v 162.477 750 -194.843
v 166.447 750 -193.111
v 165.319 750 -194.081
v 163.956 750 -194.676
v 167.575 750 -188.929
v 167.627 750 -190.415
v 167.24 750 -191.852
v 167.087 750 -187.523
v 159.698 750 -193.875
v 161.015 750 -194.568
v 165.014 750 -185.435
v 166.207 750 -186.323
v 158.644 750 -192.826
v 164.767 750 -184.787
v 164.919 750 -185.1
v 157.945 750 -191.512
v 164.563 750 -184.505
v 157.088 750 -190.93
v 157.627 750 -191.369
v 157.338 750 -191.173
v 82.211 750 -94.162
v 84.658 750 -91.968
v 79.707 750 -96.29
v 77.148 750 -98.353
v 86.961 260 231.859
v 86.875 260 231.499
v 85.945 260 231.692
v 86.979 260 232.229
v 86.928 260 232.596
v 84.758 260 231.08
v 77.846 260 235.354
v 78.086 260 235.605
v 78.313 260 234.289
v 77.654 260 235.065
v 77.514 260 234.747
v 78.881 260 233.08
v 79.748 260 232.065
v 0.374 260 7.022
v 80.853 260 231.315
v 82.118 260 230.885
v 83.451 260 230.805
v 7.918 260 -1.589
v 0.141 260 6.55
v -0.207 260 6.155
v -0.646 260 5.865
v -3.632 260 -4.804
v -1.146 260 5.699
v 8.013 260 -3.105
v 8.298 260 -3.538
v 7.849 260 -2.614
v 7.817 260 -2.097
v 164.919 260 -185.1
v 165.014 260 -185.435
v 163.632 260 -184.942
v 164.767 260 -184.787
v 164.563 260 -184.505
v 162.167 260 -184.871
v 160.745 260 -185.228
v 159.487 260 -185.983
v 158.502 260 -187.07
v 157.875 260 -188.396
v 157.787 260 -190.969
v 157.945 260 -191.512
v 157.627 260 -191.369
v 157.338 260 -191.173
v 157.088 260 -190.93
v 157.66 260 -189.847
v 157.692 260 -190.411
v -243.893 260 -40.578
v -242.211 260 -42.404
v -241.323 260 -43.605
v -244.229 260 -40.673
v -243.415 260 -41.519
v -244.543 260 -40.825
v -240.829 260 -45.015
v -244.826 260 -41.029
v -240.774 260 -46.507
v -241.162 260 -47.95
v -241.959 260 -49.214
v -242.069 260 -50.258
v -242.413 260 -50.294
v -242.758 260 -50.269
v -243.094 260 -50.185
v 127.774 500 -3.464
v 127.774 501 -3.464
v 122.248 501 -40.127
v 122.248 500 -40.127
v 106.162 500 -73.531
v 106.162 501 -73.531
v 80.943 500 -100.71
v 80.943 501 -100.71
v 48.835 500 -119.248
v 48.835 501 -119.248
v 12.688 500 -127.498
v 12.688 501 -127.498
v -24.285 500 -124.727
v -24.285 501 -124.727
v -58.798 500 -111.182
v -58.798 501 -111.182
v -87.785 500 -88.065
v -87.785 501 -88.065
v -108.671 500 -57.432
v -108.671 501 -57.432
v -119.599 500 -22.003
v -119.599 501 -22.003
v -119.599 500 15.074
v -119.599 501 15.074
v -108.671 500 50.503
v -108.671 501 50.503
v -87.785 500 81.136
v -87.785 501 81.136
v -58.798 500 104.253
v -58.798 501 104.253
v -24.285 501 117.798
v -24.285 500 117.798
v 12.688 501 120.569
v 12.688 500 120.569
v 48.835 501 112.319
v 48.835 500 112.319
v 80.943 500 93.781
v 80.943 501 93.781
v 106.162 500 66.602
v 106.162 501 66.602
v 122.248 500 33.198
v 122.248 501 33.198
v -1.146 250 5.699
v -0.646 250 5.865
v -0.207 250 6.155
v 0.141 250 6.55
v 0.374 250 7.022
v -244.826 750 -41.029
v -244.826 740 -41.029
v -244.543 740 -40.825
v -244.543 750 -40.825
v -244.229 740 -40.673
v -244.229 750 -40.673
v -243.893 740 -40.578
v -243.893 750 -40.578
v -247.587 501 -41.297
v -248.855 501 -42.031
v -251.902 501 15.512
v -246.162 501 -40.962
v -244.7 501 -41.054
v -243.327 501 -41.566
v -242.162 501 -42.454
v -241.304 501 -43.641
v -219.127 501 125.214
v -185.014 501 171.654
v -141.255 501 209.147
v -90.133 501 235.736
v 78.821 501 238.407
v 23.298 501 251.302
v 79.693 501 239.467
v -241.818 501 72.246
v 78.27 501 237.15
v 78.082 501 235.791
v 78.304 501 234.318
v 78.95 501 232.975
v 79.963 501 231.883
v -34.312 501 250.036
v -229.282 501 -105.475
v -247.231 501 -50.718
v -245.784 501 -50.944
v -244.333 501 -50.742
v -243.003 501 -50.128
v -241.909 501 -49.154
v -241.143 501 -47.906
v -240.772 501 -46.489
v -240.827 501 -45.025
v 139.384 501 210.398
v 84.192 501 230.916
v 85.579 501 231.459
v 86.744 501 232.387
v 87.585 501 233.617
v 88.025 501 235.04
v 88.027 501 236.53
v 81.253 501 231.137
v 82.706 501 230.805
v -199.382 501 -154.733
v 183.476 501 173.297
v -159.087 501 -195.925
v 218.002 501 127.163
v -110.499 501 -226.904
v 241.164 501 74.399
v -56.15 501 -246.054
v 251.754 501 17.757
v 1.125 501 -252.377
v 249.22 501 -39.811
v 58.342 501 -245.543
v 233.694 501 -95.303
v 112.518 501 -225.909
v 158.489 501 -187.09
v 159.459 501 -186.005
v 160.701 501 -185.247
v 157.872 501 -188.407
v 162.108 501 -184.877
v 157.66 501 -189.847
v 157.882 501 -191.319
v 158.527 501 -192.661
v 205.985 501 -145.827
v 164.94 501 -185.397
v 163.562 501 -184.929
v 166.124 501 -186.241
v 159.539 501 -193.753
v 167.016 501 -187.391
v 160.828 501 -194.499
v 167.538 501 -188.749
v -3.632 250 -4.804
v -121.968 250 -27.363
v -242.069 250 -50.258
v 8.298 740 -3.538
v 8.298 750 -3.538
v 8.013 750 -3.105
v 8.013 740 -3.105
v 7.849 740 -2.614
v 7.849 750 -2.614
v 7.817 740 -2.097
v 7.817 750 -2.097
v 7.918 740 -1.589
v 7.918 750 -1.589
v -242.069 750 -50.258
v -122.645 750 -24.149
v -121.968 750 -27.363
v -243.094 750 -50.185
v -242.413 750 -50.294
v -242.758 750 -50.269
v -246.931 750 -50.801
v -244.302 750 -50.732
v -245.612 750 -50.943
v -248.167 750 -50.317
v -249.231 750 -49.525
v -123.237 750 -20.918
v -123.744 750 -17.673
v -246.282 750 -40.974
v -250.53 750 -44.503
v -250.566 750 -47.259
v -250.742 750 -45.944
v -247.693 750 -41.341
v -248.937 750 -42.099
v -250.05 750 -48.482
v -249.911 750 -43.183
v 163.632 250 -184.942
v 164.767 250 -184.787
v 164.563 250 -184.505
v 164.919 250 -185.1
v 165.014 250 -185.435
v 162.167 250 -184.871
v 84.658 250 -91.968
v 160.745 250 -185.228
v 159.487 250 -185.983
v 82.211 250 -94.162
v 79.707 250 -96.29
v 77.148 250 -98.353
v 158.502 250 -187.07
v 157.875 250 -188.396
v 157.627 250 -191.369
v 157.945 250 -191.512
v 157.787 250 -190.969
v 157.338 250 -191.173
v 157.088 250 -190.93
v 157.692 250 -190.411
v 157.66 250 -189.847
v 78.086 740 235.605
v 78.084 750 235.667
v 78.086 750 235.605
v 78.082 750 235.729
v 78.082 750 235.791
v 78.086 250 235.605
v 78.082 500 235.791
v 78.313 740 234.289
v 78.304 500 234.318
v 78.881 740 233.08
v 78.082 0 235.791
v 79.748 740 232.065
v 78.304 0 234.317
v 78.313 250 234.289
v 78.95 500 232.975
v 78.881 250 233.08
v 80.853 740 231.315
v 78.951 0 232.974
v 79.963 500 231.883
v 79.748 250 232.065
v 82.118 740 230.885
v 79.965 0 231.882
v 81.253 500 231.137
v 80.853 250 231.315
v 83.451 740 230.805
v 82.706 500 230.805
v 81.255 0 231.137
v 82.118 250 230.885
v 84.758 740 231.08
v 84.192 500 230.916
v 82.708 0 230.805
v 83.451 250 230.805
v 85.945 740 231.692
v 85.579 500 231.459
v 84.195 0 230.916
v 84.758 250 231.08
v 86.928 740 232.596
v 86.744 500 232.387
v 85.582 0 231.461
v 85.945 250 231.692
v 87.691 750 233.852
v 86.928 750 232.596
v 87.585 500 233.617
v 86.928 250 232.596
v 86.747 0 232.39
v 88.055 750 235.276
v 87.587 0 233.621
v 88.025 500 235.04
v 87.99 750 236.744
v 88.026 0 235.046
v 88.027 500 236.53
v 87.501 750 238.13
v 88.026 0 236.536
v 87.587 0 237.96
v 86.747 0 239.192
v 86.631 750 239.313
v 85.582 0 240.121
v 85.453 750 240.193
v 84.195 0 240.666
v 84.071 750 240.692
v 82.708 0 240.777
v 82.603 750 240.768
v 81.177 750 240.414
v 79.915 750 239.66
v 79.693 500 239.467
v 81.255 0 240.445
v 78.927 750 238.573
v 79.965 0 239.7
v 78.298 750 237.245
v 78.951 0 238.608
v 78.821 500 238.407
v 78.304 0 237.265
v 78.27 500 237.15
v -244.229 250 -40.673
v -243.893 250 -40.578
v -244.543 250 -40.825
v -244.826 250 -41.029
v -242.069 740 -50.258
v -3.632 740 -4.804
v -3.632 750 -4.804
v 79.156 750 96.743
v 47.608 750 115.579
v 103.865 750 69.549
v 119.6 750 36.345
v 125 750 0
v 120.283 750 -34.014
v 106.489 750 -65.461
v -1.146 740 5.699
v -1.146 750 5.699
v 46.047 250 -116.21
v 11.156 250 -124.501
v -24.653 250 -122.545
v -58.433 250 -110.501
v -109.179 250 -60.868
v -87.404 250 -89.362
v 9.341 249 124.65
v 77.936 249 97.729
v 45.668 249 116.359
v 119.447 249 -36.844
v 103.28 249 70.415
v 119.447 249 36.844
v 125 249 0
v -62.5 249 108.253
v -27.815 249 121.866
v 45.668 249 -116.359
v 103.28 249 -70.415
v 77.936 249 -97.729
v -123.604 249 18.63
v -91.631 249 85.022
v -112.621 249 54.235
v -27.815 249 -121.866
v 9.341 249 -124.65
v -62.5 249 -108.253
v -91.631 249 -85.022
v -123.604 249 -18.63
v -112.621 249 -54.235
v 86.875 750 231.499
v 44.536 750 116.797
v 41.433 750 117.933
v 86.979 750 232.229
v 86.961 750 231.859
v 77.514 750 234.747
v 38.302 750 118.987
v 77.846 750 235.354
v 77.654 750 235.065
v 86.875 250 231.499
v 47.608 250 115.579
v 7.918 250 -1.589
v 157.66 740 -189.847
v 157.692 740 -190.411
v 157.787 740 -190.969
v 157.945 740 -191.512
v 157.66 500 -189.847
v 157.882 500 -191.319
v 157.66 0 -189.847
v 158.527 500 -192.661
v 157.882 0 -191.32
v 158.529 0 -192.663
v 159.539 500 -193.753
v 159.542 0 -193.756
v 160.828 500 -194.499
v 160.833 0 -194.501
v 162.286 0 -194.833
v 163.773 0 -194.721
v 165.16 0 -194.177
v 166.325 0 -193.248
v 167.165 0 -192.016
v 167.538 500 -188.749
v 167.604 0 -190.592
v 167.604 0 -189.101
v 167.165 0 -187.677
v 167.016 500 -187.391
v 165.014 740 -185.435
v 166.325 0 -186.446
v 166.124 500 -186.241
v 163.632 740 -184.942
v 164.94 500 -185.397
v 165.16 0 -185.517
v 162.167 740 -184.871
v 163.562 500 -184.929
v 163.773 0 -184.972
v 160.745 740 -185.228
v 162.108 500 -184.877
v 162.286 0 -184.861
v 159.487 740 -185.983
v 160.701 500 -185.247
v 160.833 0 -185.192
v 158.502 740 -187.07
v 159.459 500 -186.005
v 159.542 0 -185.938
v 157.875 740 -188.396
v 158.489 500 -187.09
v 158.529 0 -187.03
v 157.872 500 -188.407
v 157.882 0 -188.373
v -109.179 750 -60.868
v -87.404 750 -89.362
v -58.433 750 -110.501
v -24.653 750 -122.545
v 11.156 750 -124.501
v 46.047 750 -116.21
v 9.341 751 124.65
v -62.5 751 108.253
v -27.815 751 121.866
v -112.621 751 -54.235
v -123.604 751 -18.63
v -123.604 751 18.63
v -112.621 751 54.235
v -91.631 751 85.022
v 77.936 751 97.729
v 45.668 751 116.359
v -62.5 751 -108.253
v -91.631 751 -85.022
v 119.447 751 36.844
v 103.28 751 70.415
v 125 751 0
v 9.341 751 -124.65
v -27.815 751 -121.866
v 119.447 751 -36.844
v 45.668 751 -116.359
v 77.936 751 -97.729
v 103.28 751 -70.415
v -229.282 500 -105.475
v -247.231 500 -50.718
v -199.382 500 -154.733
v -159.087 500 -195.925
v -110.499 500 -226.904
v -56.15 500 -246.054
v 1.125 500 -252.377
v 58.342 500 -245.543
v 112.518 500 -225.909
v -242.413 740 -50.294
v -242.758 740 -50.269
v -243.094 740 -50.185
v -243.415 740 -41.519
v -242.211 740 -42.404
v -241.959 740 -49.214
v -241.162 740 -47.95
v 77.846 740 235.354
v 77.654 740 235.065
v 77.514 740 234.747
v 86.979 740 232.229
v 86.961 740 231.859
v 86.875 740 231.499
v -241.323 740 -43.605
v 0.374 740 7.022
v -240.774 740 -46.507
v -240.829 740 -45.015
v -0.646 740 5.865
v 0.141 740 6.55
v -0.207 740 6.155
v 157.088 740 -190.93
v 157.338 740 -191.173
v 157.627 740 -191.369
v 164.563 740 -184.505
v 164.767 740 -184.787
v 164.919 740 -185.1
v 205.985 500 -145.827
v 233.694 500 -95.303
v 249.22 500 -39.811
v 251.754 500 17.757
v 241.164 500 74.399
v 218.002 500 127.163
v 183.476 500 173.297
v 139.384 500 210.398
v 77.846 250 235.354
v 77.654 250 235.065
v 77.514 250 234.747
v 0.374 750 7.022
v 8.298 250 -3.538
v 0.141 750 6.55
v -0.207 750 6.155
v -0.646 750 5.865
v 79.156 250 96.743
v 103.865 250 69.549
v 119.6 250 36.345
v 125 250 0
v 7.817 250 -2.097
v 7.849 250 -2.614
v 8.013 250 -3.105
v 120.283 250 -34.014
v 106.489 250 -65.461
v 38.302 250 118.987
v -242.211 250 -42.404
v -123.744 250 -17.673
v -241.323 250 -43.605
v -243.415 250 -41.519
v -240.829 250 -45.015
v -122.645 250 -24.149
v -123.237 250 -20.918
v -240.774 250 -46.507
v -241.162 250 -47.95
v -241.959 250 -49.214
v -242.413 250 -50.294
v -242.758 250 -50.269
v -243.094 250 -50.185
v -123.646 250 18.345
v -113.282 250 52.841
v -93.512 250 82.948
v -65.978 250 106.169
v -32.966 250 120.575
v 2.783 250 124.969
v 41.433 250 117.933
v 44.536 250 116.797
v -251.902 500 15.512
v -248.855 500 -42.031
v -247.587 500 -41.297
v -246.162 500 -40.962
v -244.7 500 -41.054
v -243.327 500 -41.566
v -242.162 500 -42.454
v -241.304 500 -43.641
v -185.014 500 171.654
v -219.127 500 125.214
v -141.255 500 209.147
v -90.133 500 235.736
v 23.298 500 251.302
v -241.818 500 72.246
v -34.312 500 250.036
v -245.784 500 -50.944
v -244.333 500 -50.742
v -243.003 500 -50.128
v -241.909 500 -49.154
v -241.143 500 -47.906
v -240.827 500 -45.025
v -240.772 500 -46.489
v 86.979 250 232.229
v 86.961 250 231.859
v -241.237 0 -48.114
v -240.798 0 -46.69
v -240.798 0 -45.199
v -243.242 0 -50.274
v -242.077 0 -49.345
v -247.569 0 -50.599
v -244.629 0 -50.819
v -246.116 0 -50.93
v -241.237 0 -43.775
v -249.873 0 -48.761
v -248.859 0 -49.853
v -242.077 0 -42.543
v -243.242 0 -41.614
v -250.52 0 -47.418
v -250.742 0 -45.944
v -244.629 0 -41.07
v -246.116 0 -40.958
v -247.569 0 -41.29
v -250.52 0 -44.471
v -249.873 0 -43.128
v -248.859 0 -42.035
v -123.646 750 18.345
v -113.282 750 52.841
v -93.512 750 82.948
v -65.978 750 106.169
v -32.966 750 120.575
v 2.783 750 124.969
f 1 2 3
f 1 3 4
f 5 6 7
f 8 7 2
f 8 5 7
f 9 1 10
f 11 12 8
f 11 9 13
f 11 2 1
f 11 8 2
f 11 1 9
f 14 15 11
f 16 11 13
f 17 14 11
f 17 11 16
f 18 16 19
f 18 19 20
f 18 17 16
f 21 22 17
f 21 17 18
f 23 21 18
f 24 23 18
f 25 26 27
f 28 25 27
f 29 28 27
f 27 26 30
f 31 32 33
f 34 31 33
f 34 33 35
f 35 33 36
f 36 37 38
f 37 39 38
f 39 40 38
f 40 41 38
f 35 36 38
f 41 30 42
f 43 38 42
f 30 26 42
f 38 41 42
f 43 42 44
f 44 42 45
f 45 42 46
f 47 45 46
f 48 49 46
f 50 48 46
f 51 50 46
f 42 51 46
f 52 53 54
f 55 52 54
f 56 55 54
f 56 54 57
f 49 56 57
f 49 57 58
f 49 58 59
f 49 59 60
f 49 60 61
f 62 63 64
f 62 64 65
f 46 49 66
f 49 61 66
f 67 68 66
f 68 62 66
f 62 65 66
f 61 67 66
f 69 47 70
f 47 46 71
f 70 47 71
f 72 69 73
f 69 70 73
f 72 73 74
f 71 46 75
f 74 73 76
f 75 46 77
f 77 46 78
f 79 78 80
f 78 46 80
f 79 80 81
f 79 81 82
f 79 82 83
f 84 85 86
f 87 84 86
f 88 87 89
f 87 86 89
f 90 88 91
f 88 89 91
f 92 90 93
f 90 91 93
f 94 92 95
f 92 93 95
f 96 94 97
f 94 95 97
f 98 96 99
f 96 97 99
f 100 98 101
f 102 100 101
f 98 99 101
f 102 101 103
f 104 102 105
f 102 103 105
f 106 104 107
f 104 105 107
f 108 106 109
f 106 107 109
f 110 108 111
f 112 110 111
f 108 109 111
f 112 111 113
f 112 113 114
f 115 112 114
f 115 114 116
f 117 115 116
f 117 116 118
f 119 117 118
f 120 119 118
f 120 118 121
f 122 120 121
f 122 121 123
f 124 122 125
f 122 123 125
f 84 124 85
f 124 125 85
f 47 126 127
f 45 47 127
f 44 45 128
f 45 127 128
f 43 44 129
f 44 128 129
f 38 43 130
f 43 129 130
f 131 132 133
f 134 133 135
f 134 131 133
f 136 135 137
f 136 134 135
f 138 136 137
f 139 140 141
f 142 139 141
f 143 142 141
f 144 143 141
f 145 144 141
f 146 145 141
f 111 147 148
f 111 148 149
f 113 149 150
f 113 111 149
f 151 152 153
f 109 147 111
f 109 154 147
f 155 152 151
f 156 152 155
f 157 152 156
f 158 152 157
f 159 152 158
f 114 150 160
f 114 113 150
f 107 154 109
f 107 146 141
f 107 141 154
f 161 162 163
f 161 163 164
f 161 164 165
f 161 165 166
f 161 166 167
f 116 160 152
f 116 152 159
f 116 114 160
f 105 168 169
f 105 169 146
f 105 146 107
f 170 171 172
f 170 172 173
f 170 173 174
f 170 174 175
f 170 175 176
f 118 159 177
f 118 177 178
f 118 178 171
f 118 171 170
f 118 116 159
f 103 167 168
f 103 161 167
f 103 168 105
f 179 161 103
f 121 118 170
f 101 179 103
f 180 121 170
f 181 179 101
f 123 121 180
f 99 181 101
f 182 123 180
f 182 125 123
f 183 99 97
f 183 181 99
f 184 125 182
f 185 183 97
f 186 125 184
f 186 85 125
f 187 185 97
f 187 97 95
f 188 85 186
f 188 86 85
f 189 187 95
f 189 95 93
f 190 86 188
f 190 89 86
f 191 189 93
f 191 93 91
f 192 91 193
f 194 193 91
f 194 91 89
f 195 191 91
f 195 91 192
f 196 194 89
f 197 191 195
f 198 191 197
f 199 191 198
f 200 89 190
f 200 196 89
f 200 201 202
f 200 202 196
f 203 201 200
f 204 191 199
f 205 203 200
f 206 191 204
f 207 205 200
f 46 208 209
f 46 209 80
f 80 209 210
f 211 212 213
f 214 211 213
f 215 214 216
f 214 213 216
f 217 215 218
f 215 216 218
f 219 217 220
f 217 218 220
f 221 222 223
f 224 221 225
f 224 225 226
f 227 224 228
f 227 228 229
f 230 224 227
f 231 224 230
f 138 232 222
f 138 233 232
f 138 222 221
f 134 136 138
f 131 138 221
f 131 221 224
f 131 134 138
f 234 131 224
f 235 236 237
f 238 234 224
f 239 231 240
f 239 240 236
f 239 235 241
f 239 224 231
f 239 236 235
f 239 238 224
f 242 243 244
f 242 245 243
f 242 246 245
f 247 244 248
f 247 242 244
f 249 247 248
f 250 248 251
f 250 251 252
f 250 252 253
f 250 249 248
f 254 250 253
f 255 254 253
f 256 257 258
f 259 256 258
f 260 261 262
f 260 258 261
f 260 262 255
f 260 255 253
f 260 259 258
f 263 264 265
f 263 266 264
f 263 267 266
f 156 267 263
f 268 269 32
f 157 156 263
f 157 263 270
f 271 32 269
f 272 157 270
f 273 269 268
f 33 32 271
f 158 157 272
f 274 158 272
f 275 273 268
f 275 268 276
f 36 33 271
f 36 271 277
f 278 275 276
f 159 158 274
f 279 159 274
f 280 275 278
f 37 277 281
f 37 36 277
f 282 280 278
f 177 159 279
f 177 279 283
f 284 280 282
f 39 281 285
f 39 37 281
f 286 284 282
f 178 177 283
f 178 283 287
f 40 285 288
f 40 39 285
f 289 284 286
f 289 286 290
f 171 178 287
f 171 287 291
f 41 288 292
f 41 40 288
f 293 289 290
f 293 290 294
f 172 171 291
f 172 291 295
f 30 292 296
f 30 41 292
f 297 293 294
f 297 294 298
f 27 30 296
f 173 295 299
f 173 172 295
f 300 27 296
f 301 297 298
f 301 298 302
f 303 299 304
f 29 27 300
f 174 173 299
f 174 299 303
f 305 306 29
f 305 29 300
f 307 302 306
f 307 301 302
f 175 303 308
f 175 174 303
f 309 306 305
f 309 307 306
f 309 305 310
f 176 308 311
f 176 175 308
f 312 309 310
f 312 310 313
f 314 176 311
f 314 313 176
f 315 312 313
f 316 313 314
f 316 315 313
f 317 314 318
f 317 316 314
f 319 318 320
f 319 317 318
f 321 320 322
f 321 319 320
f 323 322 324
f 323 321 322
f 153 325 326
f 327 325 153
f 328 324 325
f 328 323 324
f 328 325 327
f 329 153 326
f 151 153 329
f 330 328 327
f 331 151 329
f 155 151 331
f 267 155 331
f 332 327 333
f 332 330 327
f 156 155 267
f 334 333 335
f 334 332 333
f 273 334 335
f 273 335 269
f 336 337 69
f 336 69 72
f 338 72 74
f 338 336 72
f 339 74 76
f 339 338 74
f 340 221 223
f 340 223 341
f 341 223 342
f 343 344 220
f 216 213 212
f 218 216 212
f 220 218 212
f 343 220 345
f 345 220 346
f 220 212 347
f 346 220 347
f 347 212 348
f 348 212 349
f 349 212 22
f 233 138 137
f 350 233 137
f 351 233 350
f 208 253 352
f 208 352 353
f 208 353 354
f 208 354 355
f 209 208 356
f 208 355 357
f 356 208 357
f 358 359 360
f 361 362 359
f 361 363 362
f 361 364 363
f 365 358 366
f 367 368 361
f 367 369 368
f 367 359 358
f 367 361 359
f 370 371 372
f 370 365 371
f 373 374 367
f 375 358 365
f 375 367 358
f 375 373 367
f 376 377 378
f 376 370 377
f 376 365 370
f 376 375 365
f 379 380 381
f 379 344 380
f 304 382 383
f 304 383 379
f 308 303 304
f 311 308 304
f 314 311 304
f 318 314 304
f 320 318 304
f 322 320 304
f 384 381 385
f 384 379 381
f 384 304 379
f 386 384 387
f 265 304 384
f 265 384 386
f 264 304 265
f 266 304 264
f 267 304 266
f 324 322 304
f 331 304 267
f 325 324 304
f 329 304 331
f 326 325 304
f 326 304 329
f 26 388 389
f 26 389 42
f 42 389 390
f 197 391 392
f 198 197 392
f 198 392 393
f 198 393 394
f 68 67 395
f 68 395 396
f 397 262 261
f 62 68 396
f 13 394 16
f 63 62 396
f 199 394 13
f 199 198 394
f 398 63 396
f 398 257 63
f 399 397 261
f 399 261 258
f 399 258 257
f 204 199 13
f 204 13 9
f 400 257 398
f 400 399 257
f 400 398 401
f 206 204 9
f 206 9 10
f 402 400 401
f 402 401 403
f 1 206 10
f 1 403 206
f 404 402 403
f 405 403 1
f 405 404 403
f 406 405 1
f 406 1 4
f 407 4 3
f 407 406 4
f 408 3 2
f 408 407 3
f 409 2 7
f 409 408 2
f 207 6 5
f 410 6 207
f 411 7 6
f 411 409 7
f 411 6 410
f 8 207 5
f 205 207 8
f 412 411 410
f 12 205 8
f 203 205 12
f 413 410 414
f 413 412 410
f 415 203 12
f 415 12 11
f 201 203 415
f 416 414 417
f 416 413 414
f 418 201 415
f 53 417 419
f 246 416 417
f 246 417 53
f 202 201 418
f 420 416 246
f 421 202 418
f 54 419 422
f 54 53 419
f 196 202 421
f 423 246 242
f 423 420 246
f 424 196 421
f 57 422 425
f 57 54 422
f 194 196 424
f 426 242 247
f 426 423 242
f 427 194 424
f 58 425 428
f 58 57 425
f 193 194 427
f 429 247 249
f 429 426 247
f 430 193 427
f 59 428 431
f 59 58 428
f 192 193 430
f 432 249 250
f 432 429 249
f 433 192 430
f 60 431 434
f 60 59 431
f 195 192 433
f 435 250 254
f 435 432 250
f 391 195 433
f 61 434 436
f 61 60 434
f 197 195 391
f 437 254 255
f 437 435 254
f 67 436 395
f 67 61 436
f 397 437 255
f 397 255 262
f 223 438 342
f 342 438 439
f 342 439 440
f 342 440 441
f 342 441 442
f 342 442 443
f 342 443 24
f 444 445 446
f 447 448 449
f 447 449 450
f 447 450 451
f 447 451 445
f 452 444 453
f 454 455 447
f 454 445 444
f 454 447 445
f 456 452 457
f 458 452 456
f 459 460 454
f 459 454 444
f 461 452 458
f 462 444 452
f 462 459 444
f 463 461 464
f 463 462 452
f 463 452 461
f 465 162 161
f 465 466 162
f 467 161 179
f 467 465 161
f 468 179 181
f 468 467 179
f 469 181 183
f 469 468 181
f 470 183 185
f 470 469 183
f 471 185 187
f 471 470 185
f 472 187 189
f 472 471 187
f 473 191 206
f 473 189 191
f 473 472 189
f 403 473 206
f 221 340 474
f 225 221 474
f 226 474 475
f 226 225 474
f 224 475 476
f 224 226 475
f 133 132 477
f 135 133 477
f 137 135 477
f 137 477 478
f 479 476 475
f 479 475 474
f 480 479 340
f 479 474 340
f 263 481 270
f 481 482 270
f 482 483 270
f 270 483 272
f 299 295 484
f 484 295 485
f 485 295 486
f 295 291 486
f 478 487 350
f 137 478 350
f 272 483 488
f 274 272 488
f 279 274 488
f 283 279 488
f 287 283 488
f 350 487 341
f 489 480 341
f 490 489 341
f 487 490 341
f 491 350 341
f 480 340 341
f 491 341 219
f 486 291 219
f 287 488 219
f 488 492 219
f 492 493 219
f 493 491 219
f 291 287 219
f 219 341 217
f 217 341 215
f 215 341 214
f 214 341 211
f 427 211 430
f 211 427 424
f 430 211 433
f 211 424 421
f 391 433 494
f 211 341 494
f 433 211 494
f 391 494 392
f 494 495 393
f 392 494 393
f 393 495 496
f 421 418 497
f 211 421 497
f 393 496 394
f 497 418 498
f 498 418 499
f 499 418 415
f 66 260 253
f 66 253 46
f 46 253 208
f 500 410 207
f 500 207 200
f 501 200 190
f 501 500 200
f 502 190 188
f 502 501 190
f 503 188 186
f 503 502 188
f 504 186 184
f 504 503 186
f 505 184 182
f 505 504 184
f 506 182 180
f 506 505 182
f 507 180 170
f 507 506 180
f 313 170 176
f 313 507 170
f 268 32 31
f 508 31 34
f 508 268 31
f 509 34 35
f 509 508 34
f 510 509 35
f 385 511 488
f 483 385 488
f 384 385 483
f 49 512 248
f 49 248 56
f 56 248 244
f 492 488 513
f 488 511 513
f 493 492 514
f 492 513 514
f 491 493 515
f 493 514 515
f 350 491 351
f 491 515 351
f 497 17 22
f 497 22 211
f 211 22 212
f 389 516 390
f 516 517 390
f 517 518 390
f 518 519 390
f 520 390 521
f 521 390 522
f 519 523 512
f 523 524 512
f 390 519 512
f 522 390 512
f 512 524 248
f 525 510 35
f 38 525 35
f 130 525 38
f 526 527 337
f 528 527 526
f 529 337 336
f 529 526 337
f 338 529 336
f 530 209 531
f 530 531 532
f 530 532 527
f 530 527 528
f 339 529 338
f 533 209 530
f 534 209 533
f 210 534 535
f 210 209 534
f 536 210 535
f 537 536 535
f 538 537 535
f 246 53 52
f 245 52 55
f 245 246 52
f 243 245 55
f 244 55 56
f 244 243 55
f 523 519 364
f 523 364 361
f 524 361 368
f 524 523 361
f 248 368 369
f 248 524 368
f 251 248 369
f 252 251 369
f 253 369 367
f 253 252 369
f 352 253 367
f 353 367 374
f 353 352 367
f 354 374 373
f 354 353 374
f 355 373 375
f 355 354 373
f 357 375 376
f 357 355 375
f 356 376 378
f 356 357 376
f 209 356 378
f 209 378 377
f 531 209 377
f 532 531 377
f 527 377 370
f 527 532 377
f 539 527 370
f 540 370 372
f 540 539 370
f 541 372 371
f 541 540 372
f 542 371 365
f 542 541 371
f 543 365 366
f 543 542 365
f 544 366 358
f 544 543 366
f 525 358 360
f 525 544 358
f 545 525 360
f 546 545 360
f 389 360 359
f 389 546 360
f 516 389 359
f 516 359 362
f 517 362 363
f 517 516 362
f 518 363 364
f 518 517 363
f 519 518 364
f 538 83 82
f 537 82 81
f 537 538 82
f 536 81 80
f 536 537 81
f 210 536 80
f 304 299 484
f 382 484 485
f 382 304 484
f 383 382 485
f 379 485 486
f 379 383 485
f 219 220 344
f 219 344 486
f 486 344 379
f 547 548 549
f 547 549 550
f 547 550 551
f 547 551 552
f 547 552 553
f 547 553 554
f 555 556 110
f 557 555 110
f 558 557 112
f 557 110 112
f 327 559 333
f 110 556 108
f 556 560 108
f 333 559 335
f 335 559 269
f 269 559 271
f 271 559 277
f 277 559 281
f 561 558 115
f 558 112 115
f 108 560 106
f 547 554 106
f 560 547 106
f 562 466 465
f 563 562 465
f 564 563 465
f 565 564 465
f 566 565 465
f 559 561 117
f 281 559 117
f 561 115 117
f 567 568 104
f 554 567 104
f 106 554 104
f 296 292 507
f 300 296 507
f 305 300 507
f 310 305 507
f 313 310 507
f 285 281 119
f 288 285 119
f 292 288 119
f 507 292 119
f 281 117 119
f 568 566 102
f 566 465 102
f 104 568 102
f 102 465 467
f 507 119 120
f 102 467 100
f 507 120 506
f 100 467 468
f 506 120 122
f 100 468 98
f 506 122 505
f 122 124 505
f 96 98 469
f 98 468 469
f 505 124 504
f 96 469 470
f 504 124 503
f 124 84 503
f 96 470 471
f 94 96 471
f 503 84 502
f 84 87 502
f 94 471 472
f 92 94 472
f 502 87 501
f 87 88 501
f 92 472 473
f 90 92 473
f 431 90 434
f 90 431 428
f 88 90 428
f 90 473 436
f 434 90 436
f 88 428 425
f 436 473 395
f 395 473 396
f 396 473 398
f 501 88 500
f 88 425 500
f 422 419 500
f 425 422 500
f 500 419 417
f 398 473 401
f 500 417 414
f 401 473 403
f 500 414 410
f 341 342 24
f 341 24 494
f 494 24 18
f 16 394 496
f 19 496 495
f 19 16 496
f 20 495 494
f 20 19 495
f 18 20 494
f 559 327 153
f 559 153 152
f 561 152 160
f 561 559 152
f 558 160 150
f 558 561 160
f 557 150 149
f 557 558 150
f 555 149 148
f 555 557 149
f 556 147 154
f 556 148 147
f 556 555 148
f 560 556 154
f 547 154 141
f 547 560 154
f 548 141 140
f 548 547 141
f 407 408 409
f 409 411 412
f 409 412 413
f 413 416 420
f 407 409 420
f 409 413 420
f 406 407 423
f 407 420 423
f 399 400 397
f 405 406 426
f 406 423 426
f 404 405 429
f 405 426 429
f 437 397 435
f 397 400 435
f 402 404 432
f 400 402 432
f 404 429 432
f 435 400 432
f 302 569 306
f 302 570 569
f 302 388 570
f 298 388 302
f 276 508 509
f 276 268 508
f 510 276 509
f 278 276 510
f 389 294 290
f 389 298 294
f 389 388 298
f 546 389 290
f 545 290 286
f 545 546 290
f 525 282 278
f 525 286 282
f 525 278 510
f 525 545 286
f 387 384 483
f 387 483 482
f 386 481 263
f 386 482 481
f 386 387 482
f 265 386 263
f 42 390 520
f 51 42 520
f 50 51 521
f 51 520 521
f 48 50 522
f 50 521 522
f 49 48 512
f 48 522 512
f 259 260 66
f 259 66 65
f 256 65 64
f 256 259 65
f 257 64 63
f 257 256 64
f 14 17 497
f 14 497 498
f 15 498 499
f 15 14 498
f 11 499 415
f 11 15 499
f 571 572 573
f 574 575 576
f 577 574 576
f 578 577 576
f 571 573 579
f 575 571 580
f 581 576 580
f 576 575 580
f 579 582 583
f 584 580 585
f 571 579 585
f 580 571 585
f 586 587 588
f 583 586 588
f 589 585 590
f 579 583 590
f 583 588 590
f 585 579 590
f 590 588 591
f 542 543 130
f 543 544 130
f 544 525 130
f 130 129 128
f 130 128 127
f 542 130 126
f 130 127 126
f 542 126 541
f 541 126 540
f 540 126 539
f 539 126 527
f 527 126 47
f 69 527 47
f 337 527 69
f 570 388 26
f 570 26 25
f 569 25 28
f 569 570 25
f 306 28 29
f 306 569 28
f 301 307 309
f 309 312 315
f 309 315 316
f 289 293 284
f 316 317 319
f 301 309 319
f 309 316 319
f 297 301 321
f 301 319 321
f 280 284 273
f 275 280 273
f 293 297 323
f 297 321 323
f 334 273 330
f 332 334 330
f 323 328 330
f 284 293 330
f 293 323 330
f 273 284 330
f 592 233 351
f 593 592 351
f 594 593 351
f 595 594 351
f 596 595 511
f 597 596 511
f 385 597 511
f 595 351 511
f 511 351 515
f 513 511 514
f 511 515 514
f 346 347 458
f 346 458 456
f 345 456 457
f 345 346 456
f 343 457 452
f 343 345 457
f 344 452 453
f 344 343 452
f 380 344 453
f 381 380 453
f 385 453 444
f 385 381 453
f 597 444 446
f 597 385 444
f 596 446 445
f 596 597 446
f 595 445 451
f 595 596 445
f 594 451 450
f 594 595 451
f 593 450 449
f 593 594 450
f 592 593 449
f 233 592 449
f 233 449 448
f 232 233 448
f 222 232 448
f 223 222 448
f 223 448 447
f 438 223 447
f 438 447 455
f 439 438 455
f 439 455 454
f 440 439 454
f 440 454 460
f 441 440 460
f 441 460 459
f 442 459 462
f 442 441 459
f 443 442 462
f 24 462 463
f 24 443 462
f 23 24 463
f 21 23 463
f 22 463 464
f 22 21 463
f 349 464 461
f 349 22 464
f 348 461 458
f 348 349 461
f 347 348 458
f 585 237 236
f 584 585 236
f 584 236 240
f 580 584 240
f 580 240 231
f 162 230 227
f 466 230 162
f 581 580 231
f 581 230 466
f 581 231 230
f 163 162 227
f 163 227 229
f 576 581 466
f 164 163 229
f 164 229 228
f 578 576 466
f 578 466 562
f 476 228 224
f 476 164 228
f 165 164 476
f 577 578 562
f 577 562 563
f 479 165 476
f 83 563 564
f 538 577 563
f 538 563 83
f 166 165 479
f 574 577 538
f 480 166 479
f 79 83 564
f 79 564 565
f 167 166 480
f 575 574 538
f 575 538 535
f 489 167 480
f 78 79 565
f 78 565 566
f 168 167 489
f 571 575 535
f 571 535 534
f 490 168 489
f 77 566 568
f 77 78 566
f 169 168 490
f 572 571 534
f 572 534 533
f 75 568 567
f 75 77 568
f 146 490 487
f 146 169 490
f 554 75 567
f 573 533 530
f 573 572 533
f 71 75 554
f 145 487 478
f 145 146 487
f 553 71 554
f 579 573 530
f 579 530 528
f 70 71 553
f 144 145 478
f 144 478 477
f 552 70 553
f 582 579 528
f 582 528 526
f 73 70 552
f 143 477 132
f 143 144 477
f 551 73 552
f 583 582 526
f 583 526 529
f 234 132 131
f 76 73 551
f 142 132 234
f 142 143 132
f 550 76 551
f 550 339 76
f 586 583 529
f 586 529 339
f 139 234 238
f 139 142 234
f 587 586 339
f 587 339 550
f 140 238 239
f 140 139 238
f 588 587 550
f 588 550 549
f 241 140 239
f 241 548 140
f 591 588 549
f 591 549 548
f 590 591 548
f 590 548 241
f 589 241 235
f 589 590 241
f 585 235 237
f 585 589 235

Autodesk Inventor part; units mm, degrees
ref_plane "YZ Plane" through (0, 0, 0) normal (1, 0, 0) x (0, 1, 0)
ref_plane "XZ Plane" through (0, 0, 0) normal (0, 1, 0) x (-1, 0, 0)
sketch "Sketch1" plane through (0, 0, 0) normal (0, 1, 0) x (-1, 0, 0)
  circle A0 centre (-83.0821, 235.7909) radius 5
  circle A1 centre (-162.6599, -189.8467) radius 5
  circle A2 centre (245.742, -45.9443) radius 5
  point P0 (0, 0)
  dimension "d3" = 10
  dimension "d4" = 10
  dimension "d5" = 10
extrude "Extrusion1" add sketch "Sketch1" along normal blind 750
sketch "Sketch2" plane through (83.0821, 750, 235.7909) normal (0, 1, 0) x (1, 0, 0)
  circle A0 centre (-328.8241, 281.7352) radius 5 projected
  circle A1 centre (79.5778, 425.6376) radius 5 projected
  line L0 (-326.9753, 276.3685) -> (-84.2277, 230.0921)
  line L1 (-82.7079, 228.7691) -> (-5.5677, 1.0437)
  circle A2 centre (0, 0) radius 5 projected
  line L2 (-325.1511, 286.0493) -> (-86.7137, 240.5946)
  line L3 (-86.7137, 240.5946) -> (74.0056, 426.7207)
  line L4 (81.481, 420.2957) -> (-74.7837, 239.3284)
  line L5 (-75.1642, 237.3796) -> (3.7927, 4.2915)
  arc A3 (-327.4871, 284.4754) -> (-328.5709, 278.6773) centre (-83.0821, 235.7909) ccw
  arc A4 (-3.0309, -0.2086) -> (2.5859, 1.7717) centre (-83.0821, 235.7909) ccw
  arc A5 (81.2864, 423.1061) -> (76.8025, 426.9477) centre (-83.0821, 235.7909) ccw
  arc A6 (-82.7079, 228.7691) -> (-84.2277, 230.0921) centre (-84.6022, 228.1275) ccw
  arc A7 (76.8025, 426.9477) -> (74.0056, 426.7207) centre (75.5193, 425.4136) ccw
  arc A8 (81.481, 420.2957) -> (81.2864, 423.1061) centre (79.9673, 421.6028) ccw
  arc A9 (2.5859, 1.7717) -> (3.7927, 4.2915) centre (1.8984, 3.6499) ccw
  arc A10 (-5.5677, 1.0437) -> (-3.0309, -0.2086) centre (-3.6734, 1.6854) ccw
  arc A11 (-74.7837, 239.3284) -> (-75.1642, 237.3796) centre (-73.2699, 238.0212) ccw
  arc A12 (-328.5709, 278.6773) -> (-326.9753, 276.3685) centre (-326.6007, 278.3331) ccw
  arc A13 (-325.1511, 286.0493) -> (-327.4871, 284.4754) centre (-325.5257, 284.0846) ccw
  point P0 (-83.0821, 235.7909)
  point P1 (-328.9022, 276.7358)
  point P2 (-4.9283, -0.8437)
  point P3 (75.2872, 428.2049)
  point P4 (82.7726, 421.7915)
  point P5 (-75.5311, 238.4628)
  point P6 (4.4165, 2.45)
  dimension "d8" = 2
  dimension "d9" = 2
extrude "Extrusion2" add sketch "Sketch2" against normal blind 10 contours A0 A12 A3 A13 | A0 A13 L2 L3 A7 A1 A8 L4 A11 L5 A9 A2 A10 L1 A6 L0 A12 | A7 A5 A8 A1 | A2 A9 A4 A10 picked at (-326.6818, 281.2494) picked at (78.1424, 423.9745) picked at (-0.6818, 2.0889)
ref_plane "Work Plane1" through (0, 500, 0) normal (0, 1, 0) x (1, 0, 0)
mirror "Mirror1" about plane through (0, 500, 0) normal (0, 1, 0) of "Extrusion2"
sketch "Sketch3" plane through (0, 750, 0) normal (0, 1, 0) x (1, 0, 0)
  circle A0 centre (0, 0) radius 125
  dimension "d13" = 250
extrude "Extrusion3" add sketch "Sketch3" along normal blind 1
mirror "Mirror2" about plane through (0, 500, 0) normal (0, 1, 0) of "Extrusion3"
sketch "Sketch4" plane through (0, 500, 0) normal (0, 1, 0) x (1, 0, 0)
  circle A0 centre (0, 0) radius 252.3793
  circle A1 centre (0, 0) radius 125
extrude "Extrusion5" add sketch "Sketch4" along normal blind 1 contours A0 | A1
sketch "Sketch5" plane through (0, 501, 0) normal (0, 1, 0) x (1, 0, 0)
  circle A0 centre (3.3929, 3.4645) radius 124.3815
  point P0 (0, 0)
extrude "Extrusion6" cut sketch "Sketch5" against normal blind 1
properties part number "boiler_plates"
